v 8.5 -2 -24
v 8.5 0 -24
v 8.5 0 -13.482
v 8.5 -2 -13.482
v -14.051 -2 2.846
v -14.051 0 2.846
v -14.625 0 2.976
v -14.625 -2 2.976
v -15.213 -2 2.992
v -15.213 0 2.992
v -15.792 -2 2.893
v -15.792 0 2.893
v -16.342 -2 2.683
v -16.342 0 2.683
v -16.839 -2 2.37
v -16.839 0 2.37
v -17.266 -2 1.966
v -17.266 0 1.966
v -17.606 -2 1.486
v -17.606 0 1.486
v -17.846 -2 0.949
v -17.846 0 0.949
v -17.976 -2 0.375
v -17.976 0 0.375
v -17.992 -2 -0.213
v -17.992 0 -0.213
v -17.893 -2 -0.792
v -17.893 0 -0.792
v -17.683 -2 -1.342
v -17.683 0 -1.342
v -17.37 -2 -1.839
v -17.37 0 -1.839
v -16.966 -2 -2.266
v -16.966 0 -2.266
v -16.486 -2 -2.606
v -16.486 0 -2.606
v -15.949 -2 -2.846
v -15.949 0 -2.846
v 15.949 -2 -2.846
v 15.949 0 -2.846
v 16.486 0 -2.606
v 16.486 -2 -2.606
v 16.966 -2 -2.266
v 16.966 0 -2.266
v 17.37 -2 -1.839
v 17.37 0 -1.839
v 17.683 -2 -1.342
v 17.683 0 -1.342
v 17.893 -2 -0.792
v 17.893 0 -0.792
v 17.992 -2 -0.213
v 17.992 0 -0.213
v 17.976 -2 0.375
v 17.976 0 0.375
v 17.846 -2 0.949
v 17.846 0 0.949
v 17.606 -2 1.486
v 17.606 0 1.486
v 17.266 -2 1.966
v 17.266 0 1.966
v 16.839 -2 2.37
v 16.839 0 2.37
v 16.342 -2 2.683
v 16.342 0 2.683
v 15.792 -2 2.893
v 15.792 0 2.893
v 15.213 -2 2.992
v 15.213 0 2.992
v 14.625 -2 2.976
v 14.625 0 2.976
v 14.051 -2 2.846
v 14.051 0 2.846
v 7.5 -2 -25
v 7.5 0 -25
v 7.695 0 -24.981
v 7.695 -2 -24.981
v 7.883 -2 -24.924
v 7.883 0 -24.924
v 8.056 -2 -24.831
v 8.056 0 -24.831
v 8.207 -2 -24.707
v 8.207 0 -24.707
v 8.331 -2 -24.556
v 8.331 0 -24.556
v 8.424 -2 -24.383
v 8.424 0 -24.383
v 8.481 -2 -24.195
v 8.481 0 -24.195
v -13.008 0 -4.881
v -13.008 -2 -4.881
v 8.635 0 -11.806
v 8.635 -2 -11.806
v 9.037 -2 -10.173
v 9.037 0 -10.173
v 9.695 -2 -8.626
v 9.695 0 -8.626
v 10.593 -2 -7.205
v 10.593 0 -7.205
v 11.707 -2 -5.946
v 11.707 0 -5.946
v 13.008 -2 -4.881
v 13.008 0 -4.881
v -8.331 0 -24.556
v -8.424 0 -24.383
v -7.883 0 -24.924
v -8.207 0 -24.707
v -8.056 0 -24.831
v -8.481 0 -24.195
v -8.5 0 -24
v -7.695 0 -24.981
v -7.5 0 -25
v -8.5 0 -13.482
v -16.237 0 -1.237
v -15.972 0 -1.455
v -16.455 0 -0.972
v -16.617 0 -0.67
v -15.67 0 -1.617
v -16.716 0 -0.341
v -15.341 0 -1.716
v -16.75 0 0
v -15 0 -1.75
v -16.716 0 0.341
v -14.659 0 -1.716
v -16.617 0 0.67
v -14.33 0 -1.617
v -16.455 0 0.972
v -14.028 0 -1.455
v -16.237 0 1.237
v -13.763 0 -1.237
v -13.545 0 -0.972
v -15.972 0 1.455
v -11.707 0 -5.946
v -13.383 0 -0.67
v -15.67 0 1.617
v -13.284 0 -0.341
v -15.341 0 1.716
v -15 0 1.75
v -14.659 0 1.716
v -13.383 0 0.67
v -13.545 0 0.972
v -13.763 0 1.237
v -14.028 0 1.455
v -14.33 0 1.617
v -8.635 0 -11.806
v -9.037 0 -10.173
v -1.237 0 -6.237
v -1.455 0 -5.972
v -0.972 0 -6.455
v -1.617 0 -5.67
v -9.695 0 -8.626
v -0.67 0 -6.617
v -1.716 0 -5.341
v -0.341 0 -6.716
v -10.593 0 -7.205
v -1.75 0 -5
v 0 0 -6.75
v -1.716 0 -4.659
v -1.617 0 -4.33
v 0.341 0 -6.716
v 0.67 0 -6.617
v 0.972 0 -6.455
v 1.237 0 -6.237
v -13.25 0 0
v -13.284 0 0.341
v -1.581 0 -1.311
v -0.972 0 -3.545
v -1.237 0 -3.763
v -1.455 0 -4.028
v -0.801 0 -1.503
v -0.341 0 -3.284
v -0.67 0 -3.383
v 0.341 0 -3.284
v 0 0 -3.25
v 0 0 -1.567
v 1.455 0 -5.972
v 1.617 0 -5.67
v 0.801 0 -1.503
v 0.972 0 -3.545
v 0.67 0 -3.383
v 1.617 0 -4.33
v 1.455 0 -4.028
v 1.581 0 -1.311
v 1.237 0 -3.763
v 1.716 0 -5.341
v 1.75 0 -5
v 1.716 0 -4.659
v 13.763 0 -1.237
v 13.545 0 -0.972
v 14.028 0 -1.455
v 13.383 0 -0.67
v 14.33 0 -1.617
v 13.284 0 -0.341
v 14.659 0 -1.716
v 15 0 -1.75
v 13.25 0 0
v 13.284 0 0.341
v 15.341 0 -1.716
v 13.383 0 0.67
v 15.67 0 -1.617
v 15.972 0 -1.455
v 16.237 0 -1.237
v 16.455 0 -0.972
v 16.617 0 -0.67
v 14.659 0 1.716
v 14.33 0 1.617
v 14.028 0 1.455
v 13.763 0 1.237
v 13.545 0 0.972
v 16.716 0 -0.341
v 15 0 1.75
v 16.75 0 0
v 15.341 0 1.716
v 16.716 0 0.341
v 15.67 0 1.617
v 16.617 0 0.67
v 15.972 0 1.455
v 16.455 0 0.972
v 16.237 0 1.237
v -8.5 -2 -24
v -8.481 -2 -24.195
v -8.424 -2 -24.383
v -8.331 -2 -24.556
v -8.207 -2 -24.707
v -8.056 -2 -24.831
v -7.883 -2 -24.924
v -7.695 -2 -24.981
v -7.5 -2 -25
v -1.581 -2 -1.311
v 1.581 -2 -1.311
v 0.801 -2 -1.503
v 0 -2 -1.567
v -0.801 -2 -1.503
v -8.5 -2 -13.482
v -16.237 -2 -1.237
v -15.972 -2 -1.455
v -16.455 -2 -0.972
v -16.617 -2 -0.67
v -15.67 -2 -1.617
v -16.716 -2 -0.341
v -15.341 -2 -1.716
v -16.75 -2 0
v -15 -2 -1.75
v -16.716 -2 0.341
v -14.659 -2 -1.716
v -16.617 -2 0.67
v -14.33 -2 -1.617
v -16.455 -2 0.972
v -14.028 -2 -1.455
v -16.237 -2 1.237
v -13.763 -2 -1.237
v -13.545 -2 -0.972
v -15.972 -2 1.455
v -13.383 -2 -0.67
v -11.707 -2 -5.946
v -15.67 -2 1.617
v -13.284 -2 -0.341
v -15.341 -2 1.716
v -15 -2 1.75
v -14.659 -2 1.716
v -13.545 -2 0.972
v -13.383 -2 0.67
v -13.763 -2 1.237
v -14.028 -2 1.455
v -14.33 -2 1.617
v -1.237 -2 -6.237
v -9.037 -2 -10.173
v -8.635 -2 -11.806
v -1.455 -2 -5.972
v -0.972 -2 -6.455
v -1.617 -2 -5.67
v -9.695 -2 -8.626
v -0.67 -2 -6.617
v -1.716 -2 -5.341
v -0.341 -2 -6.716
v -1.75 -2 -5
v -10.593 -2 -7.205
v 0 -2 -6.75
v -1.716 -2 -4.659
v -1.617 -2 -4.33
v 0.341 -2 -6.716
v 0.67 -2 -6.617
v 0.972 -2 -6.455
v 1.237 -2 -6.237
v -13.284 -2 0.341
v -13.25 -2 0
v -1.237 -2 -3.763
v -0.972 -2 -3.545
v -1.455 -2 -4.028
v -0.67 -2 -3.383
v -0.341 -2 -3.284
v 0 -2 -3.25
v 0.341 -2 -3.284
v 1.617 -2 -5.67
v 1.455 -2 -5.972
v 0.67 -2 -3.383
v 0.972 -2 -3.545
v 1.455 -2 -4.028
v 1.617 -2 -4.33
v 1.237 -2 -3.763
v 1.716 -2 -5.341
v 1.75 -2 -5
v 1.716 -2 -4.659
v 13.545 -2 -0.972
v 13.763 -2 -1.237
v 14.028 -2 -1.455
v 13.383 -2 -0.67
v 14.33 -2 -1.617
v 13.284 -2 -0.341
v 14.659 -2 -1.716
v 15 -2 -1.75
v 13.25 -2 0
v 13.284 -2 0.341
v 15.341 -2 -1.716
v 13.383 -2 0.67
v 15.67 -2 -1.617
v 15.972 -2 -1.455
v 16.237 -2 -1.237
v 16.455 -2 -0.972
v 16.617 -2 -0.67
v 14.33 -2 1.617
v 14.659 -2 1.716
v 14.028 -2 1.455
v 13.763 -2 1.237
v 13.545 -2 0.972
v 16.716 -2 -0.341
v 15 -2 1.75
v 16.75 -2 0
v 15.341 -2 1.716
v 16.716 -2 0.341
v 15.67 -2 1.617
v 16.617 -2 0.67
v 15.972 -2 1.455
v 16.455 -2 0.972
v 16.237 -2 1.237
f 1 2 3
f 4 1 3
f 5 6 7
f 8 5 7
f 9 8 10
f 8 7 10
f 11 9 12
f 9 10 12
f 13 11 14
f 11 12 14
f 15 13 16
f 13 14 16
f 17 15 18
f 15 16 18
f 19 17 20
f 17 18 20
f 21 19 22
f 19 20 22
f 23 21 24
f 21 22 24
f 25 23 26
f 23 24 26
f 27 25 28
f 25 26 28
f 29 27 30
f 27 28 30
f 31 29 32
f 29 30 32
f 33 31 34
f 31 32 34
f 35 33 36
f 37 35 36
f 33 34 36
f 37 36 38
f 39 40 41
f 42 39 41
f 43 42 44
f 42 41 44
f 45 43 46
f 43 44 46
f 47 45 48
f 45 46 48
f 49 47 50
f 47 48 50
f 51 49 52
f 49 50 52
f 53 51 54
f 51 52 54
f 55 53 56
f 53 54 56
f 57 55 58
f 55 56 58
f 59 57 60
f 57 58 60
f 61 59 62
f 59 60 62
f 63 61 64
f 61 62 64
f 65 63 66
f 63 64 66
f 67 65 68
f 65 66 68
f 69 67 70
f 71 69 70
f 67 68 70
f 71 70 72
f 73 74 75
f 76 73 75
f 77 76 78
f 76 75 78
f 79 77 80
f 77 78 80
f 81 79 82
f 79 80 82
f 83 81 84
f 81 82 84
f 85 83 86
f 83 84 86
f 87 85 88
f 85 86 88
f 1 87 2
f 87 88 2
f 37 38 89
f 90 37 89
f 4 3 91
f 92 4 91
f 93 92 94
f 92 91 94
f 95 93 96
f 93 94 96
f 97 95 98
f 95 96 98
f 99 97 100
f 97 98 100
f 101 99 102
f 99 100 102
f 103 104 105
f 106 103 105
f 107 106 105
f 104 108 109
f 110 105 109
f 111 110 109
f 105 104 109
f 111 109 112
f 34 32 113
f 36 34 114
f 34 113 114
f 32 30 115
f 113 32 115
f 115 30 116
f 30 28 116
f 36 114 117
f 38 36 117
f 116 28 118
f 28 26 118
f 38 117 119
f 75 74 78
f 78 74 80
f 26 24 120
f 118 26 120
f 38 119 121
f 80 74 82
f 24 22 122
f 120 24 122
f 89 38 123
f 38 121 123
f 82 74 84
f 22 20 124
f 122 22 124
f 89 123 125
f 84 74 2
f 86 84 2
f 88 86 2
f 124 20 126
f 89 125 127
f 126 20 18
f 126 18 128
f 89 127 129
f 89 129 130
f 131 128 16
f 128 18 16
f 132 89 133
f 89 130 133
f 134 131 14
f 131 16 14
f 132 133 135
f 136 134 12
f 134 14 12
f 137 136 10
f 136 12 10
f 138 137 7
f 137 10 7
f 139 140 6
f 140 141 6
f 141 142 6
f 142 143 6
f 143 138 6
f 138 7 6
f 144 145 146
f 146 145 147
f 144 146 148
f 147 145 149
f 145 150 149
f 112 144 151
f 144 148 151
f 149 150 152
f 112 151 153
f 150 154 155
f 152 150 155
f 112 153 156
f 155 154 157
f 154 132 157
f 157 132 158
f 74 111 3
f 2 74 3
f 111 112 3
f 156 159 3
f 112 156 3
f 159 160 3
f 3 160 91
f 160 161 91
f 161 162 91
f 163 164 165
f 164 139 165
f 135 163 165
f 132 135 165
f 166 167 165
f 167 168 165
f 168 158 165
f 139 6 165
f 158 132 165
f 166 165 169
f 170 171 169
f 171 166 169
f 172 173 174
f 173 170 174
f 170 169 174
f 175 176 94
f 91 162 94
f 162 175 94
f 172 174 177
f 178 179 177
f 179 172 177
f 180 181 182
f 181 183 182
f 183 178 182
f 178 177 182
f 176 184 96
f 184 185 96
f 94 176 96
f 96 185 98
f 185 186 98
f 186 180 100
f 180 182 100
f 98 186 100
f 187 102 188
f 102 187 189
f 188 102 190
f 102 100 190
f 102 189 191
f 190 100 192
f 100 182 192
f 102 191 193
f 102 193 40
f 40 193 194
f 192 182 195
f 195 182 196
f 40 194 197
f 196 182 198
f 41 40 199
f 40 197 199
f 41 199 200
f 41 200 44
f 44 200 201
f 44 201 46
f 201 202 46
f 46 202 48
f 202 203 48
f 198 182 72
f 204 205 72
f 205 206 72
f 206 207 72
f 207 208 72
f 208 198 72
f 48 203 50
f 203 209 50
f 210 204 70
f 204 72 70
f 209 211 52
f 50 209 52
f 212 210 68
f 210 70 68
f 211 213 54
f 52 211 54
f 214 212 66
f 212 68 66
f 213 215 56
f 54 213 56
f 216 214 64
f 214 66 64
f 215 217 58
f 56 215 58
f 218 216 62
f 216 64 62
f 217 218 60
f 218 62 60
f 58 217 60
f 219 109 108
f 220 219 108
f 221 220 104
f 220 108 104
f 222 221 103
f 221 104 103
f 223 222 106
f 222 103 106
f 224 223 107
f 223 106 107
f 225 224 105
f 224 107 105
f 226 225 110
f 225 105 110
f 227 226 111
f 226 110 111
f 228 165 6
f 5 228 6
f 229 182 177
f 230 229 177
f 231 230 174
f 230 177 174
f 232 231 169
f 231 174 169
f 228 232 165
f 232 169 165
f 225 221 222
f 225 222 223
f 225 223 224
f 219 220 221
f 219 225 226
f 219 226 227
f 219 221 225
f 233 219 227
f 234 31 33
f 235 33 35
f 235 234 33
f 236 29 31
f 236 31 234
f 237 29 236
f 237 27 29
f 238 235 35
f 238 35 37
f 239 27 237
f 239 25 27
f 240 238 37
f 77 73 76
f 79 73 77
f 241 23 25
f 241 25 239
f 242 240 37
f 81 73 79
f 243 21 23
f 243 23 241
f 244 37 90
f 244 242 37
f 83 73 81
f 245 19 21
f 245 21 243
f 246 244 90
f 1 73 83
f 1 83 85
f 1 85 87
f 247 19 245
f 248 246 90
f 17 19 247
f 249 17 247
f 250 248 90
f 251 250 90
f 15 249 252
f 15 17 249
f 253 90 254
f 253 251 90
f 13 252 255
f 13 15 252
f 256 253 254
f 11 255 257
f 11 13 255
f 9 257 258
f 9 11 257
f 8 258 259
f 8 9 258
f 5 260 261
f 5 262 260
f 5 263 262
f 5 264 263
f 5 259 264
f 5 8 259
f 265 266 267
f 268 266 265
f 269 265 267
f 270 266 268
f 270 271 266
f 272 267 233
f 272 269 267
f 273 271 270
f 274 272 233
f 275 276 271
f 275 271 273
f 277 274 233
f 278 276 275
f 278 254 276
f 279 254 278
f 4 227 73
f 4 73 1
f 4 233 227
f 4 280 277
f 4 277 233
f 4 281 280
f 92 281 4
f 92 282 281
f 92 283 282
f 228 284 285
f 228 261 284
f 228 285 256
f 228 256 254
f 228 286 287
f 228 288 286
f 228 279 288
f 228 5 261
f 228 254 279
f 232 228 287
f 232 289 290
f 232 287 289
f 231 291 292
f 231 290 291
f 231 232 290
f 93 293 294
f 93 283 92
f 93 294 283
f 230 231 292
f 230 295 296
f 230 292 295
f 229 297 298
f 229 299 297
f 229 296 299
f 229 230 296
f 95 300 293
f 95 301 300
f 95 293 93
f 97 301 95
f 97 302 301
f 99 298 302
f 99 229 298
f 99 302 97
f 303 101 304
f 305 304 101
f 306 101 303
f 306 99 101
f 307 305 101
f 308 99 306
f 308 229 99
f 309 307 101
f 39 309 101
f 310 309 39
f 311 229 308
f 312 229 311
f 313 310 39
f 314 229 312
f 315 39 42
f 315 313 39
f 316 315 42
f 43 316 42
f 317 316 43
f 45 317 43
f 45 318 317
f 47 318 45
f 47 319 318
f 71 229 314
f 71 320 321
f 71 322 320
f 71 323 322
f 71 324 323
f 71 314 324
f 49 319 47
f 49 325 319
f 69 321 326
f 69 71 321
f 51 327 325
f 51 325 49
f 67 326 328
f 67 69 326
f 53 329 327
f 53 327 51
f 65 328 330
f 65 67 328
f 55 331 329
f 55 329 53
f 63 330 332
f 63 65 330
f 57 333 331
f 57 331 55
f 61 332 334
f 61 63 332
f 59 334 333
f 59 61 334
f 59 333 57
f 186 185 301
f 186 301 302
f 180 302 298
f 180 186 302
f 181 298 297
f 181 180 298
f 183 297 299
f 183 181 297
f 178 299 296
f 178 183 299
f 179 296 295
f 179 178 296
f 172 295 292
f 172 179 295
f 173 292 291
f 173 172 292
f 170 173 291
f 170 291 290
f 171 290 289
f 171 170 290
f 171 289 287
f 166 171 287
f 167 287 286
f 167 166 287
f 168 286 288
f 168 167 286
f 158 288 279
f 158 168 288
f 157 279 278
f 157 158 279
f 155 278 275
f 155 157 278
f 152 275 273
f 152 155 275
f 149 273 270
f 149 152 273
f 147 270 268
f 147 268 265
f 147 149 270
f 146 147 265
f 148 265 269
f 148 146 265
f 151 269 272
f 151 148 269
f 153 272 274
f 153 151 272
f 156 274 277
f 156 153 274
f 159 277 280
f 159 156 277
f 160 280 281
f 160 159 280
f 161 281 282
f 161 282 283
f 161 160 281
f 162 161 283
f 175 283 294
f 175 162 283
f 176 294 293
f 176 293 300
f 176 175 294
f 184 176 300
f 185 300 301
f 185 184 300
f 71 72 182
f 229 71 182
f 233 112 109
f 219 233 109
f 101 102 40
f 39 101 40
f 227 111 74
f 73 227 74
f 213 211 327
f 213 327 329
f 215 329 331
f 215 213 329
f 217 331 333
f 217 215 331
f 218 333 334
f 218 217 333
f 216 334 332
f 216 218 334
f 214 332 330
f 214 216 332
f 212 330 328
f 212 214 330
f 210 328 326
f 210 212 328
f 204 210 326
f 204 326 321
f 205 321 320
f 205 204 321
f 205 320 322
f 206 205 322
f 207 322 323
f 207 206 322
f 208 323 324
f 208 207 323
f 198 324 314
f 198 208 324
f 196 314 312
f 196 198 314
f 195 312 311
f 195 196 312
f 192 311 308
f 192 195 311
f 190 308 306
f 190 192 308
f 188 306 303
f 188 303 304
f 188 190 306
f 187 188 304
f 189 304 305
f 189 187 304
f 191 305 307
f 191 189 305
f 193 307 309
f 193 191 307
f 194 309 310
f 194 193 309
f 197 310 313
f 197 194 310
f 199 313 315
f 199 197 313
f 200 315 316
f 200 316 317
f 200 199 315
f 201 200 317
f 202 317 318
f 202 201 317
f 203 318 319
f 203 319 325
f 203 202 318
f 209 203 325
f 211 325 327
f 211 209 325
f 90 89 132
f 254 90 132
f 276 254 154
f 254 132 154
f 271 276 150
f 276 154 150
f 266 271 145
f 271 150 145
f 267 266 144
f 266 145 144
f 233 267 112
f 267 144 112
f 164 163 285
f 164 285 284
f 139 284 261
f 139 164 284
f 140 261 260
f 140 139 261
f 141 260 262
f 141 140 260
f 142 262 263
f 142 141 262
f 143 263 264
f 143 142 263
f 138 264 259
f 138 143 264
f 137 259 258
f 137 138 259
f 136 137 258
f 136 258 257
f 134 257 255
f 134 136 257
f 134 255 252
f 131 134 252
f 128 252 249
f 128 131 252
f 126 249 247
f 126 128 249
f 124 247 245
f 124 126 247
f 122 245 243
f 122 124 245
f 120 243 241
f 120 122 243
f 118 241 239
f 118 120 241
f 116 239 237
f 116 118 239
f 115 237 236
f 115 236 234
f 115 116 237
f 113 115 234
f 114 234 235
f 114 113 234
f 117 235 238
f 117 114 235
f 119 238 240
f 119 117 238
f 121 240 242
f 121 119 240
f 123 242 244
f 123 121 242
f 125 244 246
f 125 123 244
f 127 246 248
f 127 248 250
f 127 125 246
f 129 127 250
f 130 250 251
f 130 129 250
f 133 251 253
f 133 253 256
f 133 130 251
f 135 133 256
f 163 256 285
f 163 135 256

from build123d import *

# Parameters (mm, degrees)
F0_R     = 1.75
F1_DEPTH = 2


with BuildPart() as f1:
    # F0 (on Front) → F1 (new body)
    with BuildSketch(Plane.XZ):
        with BuildLine():
            Line((13.0079, -4.880859), (15.948683, -2.84605))
            ThreePointArc((15.948683, -2.84605), (17.84605, 0.948683), (14.051317, 2.84605))
            Line((14.051317, 2.84605), (1.581139, -1.310676))
            ThreePointArc((1.581139, -1.310676), (0, -1.56726), (-1.581139, -1.310676))
            Line((-1.581139, -1.310676), (-14.051317, 2.84605))
            ThreePointArc((-14.051317, 2.84605), (-17.84605, 0.948683), (-15.948683, -2.84605))
            Line((-15.948683, -2.84605), (-13.0079, -4.880859))
            ThreePointArc((-13.0079, -4.880859), (-9.695273, -8.626463), (-8.5, -13.481807))
            Line((-8.5, -13.481807), (-8.5, -24))
            ThreePointArc((-8.5, -24), (-8.207107, -24.707107), (-7.5, -25))
            Line((-7.5, -25), (0, -25))
            Line((0, -25), (7.5, -25))
            ThreePointArc((7.5, -25), (8.207107, -24.707107), (8.5, -24))
            Line((8.5, -24), (8.5, -13.481807))
            ThreePointArc((8.5, -13.481807), (9.695273, -8.626463), (13.0079, -4.880859))
        make_face()
        with Locations((-15, 0)):
            Circle(F0_R, mode=Mode.SUBTRACT)
        with Locations((0, -5)):
            Circle(F0_R, mode=Mode.SUBTRACT)
        with Locations((15, 0)):
            Circle(F0_R, mode=Mode.SUBTRACT)
    extrude(amount=F1_DEPTH)


solid = f1.part
